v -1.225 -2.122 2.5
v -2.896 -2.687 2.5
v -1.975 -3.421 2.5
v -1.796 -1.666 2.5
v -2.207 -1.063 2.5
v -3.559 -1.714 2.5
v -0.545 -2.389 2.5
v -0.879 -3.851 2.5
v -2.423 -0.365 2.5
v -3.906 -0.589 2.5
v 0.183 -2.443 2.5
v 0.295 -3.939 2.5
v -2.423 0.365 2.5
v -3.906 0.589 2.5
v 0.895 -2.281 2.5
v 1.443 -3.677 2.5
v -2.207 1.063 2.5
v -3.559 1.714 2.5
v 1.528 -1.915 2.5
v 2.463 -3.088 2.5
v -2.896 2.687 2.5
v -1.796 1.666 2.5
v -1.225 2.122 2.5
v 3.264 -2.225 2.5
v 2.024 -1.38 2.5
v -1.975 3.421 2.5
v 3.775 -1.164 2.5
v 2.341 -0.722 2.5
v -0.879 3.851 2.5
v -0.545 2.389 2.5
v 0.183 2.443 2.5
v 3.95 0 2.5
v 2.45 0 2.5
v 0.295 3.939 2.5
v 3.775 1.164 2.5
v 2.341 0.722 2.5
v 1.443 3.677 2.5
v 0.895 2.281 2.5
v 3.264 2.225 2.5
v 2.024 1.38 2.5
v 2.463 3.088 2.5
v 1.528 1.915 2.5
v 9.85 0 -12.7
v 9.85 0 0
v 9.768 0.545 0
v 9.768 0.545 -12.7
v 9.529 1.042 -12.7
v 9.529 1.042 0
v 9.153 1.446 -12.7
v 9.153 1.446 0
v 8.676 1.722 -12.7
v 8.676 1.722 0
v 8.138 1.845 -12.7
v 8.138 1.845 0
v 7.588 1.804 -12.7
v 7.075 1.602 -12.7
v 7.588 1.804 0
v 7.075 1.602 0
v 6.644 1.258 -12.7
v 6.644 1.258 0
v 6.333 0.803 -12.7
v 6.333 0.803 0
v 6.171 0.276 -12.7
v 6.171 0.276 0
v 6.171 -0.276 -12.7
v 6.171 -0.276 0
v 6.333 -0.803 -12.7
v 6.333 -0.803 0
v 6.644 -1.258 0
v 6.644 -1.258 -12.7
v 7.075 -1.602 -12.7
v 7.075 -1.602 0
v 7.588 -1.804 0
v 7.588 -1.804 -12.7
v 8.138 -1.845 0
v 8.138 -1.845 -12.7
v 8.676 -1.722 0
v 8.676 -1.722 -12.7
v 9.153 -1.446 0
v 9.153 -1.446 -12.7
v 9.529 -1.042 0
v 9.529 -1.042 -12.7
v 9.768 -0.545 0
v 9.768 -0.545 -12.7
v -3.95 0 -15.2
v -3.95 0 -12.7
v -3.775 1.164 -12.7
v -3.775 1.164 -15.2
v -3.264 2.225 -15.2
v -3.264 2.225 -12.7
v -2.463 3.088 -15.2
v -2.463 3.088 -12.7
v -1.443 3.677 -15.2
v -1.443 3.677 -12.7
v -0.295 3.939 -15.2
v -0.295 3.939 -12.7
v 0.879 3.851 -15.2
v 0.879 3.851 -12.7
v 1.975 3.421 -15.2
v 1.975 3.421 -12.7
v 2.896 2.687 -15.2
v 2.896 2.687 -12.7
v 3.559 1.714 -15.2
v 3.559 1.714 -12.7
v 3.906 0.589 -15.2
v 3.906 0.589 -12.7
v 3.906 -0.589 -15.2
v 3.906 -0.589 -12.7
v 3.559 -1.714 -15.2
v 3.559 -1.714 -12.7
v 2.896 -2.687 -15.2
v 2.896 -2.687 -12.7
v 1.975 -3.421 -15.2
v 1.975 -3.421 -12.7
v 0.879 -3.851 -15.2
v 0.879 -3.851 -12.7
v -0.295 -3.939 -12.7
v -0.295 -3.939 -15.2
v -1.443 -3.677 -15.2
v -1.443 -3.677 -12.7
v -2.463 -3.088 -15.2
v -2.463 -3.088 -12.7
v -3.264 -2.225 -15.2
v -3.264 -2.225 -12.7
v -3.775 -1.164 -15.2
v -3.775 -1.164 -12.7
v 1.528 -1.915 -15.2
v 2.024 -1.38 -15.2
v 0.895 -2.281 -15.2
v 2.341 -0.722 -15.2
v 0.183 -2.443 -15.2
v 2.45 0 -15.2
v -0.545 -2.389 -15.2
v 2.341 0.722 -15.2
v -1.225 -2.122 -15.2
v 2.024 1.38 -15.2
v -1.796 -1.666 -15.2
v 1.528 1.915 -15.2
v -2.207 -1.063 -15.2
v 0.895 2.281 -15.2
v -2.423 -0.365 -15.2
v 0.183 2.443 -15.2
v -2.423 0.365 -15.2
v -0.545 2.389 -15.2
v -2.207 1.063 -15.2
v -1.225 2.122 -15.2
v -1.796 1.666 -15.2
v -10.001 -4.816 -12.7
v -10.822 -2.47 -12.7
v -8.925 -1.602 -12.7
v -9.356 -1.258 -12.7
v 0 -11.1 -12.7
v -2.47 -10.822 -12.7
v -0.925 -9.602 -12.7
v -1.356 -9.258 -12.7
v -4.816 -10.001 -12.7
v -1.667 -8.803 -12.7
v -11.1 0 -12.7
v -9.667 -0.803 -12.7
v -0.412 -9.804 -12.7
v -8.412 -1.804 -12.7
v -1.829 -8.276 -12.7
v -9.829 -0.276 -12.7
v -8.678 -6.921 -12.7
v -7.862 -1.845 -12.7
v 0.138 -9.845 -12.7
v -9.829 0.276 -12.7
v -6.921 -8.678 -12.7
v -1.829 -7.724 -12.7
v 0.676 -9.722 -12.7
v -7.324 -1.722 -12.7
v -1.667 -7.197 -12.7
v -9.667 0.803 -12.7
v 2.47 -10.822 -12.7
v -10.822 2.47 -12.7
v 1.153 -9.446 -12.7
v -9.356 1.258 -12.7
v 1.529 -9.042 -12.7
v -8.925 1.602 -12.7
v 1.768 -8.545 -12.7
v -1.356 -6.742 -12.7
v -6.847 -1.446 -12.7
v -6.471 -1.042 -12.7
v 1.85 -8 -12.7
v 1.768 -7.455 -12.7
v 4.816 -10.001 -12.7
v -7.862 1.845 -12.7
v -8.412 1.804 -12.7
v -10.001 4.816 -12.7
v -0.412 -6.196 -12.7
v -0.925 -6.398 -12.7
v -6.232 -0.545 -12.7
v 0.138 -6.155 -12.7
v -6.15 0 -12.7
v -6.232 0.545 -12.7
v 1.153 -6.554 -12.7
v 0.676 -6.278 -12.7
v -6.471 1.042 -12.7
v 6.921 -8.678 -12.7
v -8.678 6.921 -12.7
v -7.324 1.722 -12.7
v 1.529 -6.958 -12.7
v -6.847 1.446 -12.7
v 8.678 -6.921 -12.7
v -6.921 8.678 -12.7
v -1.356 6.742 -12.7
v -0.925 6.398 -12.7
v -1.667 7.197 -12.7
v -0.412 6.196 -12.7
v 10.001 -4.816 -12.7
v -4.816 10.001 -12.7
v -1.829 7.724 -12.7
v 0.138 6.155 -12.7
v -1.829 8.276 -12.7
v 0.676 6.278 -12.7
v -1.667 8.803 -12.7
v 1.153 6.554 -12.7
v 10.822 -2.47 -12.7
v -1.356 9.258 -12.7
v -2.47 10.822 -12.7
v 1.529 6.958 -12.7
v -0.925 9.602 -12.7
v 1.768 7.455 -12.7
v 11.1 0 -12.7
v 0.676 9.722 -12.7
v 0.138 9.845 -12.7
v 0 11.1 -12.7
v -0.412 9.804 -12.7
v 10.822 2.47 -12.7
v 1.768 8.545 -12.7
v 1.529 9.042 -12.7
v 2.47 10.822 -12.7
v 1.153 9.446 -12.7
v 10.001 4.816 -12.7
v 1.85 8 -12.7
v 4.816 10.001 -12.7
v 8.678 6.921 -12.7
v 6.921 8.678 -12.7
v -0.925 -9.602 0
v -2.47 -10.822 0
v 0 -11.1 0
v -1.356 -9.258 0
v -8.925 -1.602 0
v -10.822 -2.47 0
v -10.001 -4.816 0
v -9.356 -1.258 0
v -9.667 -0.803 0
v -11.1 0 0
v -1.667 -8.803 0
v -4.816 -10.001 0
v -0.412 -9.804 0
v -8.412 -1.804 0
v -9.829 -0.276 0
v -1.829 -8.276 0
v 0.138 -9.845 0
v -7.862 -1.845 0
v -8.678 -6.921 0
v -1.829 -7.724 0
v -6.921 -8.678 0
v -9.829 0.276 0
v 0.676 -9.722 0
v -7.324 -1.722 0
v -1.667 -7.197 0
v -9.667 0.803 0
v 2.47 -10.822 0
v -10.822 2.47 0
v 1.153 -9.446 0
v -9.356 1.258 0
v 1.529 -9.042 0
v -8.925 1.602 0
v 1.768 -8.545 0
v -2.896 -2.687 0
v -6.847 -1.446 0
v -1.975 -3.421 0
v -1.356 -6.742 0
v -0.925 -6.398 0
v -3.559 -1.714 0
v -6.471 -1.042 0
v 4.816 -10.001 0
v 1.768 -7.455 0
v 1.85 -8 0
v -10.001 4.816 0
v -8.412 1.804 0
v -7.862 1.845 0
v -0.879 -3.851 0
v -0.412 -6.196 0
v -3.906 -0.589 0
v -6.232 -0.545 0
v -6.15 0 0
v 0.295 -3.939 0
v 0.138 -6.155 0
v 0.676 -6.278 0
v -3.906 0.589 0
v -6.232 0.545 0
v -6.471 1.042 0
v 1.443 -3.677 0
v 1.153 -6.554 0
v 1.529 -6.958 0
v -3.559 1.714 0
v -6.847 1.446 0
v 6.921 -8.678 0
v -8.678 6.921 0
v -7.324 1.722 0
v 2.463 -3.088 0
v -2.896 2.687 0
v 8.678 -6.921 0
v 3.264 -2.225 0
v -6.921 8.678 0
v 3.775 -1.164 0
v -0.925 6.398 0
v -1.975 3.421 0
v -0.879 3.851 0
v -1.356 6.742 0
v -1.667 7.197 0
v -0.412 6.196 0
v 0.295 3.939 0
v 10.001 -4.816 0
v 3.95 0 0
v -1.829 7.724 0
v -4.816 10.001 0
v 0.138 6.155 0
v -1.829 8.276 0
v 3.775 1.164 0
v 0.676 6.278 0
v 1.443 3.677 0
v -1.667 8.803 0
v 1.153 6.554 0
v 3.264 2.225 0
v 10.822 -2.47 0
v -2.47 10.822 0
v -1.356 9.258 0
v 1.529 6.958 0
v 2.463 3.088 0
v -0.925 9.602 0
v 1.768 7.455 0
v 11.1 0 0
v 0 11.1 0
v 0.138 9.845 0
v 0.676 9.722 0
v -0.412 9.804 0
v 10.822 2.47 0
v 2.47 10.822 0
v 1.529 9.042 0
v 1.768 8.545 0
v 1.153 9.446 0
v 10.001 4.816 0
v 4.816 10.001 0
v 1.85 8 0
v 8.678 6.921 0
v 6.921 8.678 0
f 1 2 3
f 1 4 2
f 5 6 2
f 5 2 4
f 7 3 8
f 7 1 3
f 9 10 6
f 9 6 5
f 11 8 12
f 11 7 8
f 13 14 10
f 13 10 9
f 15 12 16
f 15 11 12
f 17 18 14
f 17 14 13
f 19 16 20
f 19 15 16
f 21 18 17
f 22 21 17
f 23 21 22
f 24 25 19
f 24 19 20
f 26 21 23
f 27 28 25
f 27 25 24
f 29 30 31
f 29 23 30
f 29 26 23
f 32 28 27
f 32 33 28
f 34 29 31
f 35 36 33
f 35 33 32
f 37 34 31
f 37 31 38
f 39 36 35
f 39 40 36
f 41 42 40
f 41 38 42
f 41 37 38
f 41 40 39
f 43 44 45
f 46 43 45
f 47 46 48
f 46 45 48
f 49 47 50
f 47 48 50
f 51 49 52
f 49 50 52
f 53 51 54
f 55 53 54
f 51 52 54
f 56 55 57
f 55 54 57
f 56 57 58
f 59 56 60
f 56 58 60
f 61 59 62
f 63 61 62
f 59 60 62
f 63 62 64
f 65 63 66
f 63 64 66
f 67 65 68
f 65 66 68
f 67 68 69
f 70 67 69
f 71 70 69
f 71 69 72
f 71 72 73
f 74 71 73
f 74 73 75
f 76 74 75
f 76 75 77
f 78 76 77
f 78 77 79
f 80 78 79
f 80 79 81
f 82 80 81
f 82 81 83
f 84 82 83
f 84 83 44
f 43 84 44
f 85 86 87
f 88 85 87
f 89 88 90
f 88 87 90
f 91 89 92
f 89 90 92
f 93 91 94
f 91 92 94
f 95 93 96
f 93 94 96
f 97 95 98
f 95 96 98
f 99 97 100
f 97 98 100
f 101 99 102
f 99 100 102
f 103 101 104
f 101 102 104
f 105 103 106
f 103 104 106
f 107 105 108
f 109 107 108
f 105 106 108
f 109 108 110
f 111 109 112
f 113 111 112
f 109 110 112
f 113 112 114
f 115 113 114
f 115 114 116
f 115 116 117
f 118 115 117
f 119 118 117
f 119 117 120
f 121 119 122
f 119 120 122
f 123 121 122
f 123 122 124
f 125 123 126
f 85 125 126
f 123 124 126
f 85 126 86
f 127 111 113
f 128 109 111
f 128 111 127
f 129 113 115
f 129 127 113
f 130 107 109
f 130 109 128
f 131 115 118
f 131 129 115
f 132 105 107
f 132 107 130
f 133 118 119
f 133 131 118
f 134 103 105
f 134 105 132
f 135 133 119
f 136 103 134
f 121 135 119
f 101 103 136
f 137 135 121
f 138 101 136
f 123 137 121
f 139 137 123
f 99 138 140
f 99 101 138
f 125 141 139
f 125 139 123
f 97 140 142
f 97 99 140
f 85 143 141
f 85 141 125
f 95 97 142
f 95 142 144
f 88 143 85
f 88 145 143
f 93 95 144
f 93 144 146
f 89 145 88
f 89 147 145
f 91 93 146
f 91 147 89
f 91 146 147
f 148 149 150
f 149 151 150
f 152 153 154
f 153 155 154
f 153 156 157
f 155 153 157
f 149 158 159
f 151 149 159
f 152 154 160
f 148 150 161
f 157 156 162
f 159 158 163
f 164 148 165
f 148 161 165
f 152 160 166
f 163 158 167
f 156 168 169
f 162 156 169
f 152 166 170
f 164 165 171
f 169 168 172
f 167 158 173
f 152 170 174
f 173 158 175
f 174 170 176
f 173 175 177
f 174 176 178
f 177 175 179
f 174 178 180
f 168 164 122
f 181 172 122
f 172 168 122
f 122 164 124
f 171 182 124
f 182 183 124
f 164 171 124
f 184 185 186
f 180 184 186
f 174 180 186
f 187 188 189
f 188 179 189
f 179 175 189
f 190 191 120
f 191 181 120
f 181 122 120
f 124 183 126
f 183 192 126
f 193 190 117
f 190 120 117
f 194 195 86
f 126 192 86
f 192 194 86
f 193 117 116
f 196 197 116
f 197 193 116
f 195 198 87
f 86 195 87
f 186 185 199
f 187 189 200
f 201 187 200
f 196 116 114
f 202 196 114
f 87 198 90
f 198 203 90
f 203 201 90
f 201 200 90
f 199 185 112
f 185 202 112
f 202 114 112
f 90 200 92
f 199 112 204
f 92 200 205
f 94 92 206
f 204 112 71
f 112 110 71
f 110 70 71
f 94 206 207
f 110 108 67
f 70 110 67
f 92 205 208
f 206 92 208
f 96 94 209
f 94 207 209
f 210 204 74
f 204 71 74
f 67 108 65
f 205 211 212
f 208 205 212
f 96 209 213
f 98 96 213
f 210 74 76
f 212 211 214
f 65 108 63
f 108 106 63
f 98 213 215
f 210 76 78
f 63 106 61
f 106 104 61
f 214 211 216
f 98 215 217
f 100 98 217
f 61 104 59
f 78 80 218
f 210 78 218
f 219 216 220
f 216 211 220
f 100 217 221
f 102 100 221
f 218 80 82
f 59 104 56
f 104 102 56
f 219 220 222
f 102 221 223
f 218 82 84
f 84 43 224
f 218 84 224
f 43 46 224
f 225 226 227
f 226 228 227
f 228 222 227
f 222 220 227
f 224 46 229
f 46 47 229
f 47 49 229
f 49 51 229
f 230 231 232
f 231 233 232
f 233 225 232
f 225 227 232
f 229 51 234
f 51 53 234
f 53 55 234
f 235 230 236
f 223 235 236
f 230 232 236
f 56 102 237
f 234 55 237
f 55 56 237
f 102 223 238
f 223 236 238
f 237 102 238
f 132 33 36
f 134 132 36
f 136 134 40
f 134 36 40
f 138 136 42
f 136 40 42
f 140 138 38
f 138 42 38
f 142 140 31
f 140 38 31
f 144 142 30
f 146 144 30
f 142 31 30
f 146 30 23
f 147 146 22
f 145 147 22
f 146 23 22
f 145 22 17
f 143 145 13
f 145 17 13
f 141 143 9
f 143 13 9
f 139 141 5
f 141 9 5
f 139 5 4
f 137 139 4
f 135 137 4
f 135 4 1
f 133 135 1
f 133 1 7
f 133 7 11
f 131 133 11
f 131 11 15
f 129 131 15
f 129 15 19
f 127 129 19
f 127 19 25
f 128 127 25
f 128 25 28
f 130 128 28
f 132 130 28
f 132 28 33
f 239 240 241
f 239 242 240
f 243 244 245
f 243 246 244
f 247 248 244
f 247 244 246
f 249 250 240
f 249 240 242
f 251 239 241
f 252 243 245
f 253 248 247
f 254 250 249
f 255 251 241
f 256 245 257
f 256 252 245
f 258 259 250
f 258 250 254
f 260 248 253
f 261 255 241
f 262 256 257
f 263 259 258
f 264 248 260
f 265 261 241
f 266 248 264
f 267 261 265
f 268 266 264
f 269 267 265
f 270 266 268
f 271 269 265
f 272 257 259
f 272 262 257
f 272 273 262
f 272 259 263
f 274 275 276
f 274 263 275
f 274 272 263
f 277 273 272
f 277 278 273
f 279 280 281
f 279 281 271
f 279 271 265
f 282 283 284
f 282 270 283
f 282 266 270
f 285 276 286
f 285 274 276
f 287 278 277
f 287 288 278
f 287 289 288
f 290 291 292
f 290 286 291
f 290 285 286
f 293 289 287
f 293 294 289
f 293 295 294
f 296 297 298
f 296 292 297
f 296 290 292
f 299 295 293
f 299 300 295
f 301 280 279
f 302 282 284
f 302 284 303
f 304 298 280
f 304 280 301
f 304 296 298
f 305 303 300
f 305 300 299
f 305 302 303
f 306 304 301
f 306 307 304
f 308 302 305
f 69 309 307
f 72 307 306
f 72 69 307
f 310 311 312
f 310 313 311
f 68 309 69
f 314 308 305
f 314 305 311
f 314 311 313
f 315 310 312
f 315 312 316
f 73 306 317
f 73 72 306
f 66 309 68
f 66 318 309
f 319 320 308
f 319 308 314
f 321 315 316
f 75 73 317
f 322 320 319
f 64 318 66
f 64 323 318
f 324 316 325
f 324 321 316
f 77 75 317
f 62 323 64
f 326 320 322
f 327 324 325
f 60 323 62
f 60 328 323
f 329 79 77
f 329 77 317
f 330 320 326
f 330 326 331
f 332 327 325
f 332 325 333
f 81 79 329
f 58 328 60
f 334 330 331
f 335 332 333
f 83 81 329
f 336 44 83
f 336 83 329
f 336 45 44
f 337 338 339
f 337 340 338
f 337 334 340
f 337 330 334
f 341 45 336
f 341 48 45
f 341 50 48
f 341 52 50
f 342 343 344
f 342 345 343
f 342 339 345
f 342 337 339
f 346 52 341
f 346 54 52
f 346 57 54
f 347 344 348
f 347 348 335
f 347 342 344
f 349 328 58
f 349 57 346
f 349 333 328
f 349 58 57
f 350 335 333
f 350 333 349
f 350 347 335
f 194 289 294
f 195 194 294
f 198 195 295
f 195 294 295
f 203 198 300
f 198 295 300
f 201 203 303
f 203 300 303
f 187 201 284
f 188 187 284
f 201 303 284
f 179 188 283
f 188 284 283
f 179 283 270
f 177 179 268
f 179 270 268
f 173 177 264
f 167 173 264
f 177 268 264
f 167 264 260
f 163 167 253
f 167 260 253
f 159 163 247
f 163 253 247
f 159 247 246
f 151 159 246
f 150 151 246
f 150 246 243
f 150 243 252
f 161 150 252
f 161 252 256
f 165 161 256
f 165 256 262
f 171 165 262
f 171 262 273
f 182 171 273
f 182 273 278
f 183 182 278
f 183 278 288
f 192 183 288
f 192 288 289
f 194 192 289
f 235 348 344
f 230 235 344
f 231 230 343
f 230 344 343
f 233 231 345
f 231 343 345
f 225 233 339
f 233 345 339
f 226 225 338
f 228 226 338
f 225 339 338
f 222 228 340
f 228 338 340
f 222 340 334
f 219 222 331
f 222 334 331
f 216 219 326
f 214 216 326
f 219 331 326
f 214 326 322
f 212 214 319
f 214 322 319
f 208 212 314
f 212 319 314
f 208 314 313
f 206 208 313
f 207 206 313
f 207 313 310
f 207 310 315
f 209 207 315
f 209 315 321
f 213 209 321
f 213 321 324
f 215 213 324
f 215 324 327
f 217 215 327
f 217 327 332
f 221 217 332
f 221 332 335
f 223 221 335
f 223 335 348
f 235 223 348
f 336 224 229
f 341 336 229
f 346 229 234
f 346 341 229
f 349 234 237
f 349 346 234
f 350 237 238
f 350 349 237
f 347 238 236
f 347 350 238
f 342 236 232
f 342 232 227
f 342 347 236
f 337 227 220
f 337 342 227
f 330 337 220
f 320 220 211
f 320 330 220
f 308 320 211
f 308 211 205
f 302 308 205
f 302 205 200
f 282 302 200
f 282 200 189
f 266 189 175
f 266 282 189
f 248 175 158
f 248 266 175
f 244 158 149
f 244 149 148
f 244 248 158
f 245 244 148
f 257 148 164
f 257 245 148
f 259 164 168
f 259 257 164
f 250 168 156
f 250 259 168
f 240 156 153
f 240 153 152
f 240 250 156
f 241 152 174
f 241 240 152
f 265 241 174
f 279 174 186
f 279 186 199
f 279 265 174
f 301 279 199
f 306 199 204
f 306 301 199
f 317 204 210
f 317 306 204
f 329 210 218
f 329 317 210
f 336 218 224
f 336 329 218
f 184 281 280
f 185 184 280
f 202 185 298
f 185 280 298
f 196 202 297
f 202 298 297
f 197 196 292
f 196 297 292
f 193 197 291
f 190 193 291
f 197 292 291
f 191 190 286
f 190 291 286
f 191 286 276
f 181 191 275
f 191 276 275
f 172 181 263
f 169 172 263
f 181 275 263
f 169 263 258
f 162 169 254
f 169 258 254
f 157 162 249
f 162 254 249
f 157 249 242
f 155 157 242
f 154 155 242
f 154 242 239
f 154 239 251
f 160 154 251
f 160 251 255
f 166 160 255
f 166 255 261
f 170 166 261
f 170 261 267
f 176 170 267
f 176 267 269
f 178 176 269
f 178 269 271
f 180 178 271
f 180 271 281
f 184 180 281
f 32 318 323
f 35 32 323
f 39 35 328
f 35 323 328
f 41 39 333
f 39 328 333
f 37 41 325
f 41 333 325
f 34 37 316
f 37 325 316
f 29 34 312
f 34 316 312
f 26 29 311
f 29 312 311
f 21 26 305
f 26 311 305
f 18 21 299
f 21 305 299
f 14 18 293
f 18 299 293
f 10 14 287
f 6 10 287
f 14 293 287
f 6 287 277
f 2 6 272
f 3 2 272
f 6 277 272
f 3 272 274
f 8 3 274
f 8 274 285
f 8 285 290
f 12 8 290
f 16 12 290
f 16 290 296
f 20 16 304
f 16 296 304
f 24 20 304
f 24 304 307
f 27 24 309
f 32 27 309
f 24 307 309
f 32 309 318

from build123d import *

# Parameters (mm, degrees)
SKETCH1_R          = 11.1
EXTRUDE1_DEPTH     = 12.7
SKETCH3_R          = 1.85
CUT_EXTRUDE1_DEPTH = 13.7
SKETCH6_R          = 3.95
EXTRUDE3_DEPTH     = 2.5
SKETCH7_R          = 3.95
EXTRUDE4_DEPTH     = 2.5
SKETCH8_R          = 2.45
CUT_EXTRUDE2_DEPTH = 18.7


with BuildPart() as part:
    # Sketch1 → Extrude1 (new body)
    with BuildSketch(Plane.XY):
        Circle(SKETCH1_R)
    extrude(amount=-EXTRUDE1_DEPTH)

    # Sketch3 → Cut-Extrude1 (cut, through all)
    with BuildSketch(Plane.XY):
        with Locations((8, 0)):
            Circle(SKETCH3_R)
        with Locations((-8, 0)):
            Circle(SKETCH3_R)
        with Locations((0, -8)):
            Circle(SKETCH3_R)
        with Locations((0, 8)):
            Circle(SKETCH3_R)
    extrude(amount=-CUT_EXTRUDE1_DEPTH, mode=Mode.SUBTRACT)

    # Sketch6 → Extrude3 (add)
    with BuildSketch(Plane.XY):
        Circle(SKETCH6_R)
    extrude(amount=EXTRUDE3_DEPTH)

    # Sketch7 → Extrude4 (add)
    with BuildSketch(Plane(origin=(0, 0, -12.7), x_dir=(-1, 0, 0), z_dir=(0, 0, -1))):
        Circle(SKETCH7_R)
    extrude(amount=EXTRUDE4_DEPTH)

    # Sketch8 → Cut-Extrude2 (cut, through all)
    with BuildSketch(Plane.XY.offset(2.5)):
        Circle(SKETCH8_R)
    extrude(amount=-CUT_EXTRUDE2_DEPTH, mode=Mode.SUBTRACT)


solid = part.part
